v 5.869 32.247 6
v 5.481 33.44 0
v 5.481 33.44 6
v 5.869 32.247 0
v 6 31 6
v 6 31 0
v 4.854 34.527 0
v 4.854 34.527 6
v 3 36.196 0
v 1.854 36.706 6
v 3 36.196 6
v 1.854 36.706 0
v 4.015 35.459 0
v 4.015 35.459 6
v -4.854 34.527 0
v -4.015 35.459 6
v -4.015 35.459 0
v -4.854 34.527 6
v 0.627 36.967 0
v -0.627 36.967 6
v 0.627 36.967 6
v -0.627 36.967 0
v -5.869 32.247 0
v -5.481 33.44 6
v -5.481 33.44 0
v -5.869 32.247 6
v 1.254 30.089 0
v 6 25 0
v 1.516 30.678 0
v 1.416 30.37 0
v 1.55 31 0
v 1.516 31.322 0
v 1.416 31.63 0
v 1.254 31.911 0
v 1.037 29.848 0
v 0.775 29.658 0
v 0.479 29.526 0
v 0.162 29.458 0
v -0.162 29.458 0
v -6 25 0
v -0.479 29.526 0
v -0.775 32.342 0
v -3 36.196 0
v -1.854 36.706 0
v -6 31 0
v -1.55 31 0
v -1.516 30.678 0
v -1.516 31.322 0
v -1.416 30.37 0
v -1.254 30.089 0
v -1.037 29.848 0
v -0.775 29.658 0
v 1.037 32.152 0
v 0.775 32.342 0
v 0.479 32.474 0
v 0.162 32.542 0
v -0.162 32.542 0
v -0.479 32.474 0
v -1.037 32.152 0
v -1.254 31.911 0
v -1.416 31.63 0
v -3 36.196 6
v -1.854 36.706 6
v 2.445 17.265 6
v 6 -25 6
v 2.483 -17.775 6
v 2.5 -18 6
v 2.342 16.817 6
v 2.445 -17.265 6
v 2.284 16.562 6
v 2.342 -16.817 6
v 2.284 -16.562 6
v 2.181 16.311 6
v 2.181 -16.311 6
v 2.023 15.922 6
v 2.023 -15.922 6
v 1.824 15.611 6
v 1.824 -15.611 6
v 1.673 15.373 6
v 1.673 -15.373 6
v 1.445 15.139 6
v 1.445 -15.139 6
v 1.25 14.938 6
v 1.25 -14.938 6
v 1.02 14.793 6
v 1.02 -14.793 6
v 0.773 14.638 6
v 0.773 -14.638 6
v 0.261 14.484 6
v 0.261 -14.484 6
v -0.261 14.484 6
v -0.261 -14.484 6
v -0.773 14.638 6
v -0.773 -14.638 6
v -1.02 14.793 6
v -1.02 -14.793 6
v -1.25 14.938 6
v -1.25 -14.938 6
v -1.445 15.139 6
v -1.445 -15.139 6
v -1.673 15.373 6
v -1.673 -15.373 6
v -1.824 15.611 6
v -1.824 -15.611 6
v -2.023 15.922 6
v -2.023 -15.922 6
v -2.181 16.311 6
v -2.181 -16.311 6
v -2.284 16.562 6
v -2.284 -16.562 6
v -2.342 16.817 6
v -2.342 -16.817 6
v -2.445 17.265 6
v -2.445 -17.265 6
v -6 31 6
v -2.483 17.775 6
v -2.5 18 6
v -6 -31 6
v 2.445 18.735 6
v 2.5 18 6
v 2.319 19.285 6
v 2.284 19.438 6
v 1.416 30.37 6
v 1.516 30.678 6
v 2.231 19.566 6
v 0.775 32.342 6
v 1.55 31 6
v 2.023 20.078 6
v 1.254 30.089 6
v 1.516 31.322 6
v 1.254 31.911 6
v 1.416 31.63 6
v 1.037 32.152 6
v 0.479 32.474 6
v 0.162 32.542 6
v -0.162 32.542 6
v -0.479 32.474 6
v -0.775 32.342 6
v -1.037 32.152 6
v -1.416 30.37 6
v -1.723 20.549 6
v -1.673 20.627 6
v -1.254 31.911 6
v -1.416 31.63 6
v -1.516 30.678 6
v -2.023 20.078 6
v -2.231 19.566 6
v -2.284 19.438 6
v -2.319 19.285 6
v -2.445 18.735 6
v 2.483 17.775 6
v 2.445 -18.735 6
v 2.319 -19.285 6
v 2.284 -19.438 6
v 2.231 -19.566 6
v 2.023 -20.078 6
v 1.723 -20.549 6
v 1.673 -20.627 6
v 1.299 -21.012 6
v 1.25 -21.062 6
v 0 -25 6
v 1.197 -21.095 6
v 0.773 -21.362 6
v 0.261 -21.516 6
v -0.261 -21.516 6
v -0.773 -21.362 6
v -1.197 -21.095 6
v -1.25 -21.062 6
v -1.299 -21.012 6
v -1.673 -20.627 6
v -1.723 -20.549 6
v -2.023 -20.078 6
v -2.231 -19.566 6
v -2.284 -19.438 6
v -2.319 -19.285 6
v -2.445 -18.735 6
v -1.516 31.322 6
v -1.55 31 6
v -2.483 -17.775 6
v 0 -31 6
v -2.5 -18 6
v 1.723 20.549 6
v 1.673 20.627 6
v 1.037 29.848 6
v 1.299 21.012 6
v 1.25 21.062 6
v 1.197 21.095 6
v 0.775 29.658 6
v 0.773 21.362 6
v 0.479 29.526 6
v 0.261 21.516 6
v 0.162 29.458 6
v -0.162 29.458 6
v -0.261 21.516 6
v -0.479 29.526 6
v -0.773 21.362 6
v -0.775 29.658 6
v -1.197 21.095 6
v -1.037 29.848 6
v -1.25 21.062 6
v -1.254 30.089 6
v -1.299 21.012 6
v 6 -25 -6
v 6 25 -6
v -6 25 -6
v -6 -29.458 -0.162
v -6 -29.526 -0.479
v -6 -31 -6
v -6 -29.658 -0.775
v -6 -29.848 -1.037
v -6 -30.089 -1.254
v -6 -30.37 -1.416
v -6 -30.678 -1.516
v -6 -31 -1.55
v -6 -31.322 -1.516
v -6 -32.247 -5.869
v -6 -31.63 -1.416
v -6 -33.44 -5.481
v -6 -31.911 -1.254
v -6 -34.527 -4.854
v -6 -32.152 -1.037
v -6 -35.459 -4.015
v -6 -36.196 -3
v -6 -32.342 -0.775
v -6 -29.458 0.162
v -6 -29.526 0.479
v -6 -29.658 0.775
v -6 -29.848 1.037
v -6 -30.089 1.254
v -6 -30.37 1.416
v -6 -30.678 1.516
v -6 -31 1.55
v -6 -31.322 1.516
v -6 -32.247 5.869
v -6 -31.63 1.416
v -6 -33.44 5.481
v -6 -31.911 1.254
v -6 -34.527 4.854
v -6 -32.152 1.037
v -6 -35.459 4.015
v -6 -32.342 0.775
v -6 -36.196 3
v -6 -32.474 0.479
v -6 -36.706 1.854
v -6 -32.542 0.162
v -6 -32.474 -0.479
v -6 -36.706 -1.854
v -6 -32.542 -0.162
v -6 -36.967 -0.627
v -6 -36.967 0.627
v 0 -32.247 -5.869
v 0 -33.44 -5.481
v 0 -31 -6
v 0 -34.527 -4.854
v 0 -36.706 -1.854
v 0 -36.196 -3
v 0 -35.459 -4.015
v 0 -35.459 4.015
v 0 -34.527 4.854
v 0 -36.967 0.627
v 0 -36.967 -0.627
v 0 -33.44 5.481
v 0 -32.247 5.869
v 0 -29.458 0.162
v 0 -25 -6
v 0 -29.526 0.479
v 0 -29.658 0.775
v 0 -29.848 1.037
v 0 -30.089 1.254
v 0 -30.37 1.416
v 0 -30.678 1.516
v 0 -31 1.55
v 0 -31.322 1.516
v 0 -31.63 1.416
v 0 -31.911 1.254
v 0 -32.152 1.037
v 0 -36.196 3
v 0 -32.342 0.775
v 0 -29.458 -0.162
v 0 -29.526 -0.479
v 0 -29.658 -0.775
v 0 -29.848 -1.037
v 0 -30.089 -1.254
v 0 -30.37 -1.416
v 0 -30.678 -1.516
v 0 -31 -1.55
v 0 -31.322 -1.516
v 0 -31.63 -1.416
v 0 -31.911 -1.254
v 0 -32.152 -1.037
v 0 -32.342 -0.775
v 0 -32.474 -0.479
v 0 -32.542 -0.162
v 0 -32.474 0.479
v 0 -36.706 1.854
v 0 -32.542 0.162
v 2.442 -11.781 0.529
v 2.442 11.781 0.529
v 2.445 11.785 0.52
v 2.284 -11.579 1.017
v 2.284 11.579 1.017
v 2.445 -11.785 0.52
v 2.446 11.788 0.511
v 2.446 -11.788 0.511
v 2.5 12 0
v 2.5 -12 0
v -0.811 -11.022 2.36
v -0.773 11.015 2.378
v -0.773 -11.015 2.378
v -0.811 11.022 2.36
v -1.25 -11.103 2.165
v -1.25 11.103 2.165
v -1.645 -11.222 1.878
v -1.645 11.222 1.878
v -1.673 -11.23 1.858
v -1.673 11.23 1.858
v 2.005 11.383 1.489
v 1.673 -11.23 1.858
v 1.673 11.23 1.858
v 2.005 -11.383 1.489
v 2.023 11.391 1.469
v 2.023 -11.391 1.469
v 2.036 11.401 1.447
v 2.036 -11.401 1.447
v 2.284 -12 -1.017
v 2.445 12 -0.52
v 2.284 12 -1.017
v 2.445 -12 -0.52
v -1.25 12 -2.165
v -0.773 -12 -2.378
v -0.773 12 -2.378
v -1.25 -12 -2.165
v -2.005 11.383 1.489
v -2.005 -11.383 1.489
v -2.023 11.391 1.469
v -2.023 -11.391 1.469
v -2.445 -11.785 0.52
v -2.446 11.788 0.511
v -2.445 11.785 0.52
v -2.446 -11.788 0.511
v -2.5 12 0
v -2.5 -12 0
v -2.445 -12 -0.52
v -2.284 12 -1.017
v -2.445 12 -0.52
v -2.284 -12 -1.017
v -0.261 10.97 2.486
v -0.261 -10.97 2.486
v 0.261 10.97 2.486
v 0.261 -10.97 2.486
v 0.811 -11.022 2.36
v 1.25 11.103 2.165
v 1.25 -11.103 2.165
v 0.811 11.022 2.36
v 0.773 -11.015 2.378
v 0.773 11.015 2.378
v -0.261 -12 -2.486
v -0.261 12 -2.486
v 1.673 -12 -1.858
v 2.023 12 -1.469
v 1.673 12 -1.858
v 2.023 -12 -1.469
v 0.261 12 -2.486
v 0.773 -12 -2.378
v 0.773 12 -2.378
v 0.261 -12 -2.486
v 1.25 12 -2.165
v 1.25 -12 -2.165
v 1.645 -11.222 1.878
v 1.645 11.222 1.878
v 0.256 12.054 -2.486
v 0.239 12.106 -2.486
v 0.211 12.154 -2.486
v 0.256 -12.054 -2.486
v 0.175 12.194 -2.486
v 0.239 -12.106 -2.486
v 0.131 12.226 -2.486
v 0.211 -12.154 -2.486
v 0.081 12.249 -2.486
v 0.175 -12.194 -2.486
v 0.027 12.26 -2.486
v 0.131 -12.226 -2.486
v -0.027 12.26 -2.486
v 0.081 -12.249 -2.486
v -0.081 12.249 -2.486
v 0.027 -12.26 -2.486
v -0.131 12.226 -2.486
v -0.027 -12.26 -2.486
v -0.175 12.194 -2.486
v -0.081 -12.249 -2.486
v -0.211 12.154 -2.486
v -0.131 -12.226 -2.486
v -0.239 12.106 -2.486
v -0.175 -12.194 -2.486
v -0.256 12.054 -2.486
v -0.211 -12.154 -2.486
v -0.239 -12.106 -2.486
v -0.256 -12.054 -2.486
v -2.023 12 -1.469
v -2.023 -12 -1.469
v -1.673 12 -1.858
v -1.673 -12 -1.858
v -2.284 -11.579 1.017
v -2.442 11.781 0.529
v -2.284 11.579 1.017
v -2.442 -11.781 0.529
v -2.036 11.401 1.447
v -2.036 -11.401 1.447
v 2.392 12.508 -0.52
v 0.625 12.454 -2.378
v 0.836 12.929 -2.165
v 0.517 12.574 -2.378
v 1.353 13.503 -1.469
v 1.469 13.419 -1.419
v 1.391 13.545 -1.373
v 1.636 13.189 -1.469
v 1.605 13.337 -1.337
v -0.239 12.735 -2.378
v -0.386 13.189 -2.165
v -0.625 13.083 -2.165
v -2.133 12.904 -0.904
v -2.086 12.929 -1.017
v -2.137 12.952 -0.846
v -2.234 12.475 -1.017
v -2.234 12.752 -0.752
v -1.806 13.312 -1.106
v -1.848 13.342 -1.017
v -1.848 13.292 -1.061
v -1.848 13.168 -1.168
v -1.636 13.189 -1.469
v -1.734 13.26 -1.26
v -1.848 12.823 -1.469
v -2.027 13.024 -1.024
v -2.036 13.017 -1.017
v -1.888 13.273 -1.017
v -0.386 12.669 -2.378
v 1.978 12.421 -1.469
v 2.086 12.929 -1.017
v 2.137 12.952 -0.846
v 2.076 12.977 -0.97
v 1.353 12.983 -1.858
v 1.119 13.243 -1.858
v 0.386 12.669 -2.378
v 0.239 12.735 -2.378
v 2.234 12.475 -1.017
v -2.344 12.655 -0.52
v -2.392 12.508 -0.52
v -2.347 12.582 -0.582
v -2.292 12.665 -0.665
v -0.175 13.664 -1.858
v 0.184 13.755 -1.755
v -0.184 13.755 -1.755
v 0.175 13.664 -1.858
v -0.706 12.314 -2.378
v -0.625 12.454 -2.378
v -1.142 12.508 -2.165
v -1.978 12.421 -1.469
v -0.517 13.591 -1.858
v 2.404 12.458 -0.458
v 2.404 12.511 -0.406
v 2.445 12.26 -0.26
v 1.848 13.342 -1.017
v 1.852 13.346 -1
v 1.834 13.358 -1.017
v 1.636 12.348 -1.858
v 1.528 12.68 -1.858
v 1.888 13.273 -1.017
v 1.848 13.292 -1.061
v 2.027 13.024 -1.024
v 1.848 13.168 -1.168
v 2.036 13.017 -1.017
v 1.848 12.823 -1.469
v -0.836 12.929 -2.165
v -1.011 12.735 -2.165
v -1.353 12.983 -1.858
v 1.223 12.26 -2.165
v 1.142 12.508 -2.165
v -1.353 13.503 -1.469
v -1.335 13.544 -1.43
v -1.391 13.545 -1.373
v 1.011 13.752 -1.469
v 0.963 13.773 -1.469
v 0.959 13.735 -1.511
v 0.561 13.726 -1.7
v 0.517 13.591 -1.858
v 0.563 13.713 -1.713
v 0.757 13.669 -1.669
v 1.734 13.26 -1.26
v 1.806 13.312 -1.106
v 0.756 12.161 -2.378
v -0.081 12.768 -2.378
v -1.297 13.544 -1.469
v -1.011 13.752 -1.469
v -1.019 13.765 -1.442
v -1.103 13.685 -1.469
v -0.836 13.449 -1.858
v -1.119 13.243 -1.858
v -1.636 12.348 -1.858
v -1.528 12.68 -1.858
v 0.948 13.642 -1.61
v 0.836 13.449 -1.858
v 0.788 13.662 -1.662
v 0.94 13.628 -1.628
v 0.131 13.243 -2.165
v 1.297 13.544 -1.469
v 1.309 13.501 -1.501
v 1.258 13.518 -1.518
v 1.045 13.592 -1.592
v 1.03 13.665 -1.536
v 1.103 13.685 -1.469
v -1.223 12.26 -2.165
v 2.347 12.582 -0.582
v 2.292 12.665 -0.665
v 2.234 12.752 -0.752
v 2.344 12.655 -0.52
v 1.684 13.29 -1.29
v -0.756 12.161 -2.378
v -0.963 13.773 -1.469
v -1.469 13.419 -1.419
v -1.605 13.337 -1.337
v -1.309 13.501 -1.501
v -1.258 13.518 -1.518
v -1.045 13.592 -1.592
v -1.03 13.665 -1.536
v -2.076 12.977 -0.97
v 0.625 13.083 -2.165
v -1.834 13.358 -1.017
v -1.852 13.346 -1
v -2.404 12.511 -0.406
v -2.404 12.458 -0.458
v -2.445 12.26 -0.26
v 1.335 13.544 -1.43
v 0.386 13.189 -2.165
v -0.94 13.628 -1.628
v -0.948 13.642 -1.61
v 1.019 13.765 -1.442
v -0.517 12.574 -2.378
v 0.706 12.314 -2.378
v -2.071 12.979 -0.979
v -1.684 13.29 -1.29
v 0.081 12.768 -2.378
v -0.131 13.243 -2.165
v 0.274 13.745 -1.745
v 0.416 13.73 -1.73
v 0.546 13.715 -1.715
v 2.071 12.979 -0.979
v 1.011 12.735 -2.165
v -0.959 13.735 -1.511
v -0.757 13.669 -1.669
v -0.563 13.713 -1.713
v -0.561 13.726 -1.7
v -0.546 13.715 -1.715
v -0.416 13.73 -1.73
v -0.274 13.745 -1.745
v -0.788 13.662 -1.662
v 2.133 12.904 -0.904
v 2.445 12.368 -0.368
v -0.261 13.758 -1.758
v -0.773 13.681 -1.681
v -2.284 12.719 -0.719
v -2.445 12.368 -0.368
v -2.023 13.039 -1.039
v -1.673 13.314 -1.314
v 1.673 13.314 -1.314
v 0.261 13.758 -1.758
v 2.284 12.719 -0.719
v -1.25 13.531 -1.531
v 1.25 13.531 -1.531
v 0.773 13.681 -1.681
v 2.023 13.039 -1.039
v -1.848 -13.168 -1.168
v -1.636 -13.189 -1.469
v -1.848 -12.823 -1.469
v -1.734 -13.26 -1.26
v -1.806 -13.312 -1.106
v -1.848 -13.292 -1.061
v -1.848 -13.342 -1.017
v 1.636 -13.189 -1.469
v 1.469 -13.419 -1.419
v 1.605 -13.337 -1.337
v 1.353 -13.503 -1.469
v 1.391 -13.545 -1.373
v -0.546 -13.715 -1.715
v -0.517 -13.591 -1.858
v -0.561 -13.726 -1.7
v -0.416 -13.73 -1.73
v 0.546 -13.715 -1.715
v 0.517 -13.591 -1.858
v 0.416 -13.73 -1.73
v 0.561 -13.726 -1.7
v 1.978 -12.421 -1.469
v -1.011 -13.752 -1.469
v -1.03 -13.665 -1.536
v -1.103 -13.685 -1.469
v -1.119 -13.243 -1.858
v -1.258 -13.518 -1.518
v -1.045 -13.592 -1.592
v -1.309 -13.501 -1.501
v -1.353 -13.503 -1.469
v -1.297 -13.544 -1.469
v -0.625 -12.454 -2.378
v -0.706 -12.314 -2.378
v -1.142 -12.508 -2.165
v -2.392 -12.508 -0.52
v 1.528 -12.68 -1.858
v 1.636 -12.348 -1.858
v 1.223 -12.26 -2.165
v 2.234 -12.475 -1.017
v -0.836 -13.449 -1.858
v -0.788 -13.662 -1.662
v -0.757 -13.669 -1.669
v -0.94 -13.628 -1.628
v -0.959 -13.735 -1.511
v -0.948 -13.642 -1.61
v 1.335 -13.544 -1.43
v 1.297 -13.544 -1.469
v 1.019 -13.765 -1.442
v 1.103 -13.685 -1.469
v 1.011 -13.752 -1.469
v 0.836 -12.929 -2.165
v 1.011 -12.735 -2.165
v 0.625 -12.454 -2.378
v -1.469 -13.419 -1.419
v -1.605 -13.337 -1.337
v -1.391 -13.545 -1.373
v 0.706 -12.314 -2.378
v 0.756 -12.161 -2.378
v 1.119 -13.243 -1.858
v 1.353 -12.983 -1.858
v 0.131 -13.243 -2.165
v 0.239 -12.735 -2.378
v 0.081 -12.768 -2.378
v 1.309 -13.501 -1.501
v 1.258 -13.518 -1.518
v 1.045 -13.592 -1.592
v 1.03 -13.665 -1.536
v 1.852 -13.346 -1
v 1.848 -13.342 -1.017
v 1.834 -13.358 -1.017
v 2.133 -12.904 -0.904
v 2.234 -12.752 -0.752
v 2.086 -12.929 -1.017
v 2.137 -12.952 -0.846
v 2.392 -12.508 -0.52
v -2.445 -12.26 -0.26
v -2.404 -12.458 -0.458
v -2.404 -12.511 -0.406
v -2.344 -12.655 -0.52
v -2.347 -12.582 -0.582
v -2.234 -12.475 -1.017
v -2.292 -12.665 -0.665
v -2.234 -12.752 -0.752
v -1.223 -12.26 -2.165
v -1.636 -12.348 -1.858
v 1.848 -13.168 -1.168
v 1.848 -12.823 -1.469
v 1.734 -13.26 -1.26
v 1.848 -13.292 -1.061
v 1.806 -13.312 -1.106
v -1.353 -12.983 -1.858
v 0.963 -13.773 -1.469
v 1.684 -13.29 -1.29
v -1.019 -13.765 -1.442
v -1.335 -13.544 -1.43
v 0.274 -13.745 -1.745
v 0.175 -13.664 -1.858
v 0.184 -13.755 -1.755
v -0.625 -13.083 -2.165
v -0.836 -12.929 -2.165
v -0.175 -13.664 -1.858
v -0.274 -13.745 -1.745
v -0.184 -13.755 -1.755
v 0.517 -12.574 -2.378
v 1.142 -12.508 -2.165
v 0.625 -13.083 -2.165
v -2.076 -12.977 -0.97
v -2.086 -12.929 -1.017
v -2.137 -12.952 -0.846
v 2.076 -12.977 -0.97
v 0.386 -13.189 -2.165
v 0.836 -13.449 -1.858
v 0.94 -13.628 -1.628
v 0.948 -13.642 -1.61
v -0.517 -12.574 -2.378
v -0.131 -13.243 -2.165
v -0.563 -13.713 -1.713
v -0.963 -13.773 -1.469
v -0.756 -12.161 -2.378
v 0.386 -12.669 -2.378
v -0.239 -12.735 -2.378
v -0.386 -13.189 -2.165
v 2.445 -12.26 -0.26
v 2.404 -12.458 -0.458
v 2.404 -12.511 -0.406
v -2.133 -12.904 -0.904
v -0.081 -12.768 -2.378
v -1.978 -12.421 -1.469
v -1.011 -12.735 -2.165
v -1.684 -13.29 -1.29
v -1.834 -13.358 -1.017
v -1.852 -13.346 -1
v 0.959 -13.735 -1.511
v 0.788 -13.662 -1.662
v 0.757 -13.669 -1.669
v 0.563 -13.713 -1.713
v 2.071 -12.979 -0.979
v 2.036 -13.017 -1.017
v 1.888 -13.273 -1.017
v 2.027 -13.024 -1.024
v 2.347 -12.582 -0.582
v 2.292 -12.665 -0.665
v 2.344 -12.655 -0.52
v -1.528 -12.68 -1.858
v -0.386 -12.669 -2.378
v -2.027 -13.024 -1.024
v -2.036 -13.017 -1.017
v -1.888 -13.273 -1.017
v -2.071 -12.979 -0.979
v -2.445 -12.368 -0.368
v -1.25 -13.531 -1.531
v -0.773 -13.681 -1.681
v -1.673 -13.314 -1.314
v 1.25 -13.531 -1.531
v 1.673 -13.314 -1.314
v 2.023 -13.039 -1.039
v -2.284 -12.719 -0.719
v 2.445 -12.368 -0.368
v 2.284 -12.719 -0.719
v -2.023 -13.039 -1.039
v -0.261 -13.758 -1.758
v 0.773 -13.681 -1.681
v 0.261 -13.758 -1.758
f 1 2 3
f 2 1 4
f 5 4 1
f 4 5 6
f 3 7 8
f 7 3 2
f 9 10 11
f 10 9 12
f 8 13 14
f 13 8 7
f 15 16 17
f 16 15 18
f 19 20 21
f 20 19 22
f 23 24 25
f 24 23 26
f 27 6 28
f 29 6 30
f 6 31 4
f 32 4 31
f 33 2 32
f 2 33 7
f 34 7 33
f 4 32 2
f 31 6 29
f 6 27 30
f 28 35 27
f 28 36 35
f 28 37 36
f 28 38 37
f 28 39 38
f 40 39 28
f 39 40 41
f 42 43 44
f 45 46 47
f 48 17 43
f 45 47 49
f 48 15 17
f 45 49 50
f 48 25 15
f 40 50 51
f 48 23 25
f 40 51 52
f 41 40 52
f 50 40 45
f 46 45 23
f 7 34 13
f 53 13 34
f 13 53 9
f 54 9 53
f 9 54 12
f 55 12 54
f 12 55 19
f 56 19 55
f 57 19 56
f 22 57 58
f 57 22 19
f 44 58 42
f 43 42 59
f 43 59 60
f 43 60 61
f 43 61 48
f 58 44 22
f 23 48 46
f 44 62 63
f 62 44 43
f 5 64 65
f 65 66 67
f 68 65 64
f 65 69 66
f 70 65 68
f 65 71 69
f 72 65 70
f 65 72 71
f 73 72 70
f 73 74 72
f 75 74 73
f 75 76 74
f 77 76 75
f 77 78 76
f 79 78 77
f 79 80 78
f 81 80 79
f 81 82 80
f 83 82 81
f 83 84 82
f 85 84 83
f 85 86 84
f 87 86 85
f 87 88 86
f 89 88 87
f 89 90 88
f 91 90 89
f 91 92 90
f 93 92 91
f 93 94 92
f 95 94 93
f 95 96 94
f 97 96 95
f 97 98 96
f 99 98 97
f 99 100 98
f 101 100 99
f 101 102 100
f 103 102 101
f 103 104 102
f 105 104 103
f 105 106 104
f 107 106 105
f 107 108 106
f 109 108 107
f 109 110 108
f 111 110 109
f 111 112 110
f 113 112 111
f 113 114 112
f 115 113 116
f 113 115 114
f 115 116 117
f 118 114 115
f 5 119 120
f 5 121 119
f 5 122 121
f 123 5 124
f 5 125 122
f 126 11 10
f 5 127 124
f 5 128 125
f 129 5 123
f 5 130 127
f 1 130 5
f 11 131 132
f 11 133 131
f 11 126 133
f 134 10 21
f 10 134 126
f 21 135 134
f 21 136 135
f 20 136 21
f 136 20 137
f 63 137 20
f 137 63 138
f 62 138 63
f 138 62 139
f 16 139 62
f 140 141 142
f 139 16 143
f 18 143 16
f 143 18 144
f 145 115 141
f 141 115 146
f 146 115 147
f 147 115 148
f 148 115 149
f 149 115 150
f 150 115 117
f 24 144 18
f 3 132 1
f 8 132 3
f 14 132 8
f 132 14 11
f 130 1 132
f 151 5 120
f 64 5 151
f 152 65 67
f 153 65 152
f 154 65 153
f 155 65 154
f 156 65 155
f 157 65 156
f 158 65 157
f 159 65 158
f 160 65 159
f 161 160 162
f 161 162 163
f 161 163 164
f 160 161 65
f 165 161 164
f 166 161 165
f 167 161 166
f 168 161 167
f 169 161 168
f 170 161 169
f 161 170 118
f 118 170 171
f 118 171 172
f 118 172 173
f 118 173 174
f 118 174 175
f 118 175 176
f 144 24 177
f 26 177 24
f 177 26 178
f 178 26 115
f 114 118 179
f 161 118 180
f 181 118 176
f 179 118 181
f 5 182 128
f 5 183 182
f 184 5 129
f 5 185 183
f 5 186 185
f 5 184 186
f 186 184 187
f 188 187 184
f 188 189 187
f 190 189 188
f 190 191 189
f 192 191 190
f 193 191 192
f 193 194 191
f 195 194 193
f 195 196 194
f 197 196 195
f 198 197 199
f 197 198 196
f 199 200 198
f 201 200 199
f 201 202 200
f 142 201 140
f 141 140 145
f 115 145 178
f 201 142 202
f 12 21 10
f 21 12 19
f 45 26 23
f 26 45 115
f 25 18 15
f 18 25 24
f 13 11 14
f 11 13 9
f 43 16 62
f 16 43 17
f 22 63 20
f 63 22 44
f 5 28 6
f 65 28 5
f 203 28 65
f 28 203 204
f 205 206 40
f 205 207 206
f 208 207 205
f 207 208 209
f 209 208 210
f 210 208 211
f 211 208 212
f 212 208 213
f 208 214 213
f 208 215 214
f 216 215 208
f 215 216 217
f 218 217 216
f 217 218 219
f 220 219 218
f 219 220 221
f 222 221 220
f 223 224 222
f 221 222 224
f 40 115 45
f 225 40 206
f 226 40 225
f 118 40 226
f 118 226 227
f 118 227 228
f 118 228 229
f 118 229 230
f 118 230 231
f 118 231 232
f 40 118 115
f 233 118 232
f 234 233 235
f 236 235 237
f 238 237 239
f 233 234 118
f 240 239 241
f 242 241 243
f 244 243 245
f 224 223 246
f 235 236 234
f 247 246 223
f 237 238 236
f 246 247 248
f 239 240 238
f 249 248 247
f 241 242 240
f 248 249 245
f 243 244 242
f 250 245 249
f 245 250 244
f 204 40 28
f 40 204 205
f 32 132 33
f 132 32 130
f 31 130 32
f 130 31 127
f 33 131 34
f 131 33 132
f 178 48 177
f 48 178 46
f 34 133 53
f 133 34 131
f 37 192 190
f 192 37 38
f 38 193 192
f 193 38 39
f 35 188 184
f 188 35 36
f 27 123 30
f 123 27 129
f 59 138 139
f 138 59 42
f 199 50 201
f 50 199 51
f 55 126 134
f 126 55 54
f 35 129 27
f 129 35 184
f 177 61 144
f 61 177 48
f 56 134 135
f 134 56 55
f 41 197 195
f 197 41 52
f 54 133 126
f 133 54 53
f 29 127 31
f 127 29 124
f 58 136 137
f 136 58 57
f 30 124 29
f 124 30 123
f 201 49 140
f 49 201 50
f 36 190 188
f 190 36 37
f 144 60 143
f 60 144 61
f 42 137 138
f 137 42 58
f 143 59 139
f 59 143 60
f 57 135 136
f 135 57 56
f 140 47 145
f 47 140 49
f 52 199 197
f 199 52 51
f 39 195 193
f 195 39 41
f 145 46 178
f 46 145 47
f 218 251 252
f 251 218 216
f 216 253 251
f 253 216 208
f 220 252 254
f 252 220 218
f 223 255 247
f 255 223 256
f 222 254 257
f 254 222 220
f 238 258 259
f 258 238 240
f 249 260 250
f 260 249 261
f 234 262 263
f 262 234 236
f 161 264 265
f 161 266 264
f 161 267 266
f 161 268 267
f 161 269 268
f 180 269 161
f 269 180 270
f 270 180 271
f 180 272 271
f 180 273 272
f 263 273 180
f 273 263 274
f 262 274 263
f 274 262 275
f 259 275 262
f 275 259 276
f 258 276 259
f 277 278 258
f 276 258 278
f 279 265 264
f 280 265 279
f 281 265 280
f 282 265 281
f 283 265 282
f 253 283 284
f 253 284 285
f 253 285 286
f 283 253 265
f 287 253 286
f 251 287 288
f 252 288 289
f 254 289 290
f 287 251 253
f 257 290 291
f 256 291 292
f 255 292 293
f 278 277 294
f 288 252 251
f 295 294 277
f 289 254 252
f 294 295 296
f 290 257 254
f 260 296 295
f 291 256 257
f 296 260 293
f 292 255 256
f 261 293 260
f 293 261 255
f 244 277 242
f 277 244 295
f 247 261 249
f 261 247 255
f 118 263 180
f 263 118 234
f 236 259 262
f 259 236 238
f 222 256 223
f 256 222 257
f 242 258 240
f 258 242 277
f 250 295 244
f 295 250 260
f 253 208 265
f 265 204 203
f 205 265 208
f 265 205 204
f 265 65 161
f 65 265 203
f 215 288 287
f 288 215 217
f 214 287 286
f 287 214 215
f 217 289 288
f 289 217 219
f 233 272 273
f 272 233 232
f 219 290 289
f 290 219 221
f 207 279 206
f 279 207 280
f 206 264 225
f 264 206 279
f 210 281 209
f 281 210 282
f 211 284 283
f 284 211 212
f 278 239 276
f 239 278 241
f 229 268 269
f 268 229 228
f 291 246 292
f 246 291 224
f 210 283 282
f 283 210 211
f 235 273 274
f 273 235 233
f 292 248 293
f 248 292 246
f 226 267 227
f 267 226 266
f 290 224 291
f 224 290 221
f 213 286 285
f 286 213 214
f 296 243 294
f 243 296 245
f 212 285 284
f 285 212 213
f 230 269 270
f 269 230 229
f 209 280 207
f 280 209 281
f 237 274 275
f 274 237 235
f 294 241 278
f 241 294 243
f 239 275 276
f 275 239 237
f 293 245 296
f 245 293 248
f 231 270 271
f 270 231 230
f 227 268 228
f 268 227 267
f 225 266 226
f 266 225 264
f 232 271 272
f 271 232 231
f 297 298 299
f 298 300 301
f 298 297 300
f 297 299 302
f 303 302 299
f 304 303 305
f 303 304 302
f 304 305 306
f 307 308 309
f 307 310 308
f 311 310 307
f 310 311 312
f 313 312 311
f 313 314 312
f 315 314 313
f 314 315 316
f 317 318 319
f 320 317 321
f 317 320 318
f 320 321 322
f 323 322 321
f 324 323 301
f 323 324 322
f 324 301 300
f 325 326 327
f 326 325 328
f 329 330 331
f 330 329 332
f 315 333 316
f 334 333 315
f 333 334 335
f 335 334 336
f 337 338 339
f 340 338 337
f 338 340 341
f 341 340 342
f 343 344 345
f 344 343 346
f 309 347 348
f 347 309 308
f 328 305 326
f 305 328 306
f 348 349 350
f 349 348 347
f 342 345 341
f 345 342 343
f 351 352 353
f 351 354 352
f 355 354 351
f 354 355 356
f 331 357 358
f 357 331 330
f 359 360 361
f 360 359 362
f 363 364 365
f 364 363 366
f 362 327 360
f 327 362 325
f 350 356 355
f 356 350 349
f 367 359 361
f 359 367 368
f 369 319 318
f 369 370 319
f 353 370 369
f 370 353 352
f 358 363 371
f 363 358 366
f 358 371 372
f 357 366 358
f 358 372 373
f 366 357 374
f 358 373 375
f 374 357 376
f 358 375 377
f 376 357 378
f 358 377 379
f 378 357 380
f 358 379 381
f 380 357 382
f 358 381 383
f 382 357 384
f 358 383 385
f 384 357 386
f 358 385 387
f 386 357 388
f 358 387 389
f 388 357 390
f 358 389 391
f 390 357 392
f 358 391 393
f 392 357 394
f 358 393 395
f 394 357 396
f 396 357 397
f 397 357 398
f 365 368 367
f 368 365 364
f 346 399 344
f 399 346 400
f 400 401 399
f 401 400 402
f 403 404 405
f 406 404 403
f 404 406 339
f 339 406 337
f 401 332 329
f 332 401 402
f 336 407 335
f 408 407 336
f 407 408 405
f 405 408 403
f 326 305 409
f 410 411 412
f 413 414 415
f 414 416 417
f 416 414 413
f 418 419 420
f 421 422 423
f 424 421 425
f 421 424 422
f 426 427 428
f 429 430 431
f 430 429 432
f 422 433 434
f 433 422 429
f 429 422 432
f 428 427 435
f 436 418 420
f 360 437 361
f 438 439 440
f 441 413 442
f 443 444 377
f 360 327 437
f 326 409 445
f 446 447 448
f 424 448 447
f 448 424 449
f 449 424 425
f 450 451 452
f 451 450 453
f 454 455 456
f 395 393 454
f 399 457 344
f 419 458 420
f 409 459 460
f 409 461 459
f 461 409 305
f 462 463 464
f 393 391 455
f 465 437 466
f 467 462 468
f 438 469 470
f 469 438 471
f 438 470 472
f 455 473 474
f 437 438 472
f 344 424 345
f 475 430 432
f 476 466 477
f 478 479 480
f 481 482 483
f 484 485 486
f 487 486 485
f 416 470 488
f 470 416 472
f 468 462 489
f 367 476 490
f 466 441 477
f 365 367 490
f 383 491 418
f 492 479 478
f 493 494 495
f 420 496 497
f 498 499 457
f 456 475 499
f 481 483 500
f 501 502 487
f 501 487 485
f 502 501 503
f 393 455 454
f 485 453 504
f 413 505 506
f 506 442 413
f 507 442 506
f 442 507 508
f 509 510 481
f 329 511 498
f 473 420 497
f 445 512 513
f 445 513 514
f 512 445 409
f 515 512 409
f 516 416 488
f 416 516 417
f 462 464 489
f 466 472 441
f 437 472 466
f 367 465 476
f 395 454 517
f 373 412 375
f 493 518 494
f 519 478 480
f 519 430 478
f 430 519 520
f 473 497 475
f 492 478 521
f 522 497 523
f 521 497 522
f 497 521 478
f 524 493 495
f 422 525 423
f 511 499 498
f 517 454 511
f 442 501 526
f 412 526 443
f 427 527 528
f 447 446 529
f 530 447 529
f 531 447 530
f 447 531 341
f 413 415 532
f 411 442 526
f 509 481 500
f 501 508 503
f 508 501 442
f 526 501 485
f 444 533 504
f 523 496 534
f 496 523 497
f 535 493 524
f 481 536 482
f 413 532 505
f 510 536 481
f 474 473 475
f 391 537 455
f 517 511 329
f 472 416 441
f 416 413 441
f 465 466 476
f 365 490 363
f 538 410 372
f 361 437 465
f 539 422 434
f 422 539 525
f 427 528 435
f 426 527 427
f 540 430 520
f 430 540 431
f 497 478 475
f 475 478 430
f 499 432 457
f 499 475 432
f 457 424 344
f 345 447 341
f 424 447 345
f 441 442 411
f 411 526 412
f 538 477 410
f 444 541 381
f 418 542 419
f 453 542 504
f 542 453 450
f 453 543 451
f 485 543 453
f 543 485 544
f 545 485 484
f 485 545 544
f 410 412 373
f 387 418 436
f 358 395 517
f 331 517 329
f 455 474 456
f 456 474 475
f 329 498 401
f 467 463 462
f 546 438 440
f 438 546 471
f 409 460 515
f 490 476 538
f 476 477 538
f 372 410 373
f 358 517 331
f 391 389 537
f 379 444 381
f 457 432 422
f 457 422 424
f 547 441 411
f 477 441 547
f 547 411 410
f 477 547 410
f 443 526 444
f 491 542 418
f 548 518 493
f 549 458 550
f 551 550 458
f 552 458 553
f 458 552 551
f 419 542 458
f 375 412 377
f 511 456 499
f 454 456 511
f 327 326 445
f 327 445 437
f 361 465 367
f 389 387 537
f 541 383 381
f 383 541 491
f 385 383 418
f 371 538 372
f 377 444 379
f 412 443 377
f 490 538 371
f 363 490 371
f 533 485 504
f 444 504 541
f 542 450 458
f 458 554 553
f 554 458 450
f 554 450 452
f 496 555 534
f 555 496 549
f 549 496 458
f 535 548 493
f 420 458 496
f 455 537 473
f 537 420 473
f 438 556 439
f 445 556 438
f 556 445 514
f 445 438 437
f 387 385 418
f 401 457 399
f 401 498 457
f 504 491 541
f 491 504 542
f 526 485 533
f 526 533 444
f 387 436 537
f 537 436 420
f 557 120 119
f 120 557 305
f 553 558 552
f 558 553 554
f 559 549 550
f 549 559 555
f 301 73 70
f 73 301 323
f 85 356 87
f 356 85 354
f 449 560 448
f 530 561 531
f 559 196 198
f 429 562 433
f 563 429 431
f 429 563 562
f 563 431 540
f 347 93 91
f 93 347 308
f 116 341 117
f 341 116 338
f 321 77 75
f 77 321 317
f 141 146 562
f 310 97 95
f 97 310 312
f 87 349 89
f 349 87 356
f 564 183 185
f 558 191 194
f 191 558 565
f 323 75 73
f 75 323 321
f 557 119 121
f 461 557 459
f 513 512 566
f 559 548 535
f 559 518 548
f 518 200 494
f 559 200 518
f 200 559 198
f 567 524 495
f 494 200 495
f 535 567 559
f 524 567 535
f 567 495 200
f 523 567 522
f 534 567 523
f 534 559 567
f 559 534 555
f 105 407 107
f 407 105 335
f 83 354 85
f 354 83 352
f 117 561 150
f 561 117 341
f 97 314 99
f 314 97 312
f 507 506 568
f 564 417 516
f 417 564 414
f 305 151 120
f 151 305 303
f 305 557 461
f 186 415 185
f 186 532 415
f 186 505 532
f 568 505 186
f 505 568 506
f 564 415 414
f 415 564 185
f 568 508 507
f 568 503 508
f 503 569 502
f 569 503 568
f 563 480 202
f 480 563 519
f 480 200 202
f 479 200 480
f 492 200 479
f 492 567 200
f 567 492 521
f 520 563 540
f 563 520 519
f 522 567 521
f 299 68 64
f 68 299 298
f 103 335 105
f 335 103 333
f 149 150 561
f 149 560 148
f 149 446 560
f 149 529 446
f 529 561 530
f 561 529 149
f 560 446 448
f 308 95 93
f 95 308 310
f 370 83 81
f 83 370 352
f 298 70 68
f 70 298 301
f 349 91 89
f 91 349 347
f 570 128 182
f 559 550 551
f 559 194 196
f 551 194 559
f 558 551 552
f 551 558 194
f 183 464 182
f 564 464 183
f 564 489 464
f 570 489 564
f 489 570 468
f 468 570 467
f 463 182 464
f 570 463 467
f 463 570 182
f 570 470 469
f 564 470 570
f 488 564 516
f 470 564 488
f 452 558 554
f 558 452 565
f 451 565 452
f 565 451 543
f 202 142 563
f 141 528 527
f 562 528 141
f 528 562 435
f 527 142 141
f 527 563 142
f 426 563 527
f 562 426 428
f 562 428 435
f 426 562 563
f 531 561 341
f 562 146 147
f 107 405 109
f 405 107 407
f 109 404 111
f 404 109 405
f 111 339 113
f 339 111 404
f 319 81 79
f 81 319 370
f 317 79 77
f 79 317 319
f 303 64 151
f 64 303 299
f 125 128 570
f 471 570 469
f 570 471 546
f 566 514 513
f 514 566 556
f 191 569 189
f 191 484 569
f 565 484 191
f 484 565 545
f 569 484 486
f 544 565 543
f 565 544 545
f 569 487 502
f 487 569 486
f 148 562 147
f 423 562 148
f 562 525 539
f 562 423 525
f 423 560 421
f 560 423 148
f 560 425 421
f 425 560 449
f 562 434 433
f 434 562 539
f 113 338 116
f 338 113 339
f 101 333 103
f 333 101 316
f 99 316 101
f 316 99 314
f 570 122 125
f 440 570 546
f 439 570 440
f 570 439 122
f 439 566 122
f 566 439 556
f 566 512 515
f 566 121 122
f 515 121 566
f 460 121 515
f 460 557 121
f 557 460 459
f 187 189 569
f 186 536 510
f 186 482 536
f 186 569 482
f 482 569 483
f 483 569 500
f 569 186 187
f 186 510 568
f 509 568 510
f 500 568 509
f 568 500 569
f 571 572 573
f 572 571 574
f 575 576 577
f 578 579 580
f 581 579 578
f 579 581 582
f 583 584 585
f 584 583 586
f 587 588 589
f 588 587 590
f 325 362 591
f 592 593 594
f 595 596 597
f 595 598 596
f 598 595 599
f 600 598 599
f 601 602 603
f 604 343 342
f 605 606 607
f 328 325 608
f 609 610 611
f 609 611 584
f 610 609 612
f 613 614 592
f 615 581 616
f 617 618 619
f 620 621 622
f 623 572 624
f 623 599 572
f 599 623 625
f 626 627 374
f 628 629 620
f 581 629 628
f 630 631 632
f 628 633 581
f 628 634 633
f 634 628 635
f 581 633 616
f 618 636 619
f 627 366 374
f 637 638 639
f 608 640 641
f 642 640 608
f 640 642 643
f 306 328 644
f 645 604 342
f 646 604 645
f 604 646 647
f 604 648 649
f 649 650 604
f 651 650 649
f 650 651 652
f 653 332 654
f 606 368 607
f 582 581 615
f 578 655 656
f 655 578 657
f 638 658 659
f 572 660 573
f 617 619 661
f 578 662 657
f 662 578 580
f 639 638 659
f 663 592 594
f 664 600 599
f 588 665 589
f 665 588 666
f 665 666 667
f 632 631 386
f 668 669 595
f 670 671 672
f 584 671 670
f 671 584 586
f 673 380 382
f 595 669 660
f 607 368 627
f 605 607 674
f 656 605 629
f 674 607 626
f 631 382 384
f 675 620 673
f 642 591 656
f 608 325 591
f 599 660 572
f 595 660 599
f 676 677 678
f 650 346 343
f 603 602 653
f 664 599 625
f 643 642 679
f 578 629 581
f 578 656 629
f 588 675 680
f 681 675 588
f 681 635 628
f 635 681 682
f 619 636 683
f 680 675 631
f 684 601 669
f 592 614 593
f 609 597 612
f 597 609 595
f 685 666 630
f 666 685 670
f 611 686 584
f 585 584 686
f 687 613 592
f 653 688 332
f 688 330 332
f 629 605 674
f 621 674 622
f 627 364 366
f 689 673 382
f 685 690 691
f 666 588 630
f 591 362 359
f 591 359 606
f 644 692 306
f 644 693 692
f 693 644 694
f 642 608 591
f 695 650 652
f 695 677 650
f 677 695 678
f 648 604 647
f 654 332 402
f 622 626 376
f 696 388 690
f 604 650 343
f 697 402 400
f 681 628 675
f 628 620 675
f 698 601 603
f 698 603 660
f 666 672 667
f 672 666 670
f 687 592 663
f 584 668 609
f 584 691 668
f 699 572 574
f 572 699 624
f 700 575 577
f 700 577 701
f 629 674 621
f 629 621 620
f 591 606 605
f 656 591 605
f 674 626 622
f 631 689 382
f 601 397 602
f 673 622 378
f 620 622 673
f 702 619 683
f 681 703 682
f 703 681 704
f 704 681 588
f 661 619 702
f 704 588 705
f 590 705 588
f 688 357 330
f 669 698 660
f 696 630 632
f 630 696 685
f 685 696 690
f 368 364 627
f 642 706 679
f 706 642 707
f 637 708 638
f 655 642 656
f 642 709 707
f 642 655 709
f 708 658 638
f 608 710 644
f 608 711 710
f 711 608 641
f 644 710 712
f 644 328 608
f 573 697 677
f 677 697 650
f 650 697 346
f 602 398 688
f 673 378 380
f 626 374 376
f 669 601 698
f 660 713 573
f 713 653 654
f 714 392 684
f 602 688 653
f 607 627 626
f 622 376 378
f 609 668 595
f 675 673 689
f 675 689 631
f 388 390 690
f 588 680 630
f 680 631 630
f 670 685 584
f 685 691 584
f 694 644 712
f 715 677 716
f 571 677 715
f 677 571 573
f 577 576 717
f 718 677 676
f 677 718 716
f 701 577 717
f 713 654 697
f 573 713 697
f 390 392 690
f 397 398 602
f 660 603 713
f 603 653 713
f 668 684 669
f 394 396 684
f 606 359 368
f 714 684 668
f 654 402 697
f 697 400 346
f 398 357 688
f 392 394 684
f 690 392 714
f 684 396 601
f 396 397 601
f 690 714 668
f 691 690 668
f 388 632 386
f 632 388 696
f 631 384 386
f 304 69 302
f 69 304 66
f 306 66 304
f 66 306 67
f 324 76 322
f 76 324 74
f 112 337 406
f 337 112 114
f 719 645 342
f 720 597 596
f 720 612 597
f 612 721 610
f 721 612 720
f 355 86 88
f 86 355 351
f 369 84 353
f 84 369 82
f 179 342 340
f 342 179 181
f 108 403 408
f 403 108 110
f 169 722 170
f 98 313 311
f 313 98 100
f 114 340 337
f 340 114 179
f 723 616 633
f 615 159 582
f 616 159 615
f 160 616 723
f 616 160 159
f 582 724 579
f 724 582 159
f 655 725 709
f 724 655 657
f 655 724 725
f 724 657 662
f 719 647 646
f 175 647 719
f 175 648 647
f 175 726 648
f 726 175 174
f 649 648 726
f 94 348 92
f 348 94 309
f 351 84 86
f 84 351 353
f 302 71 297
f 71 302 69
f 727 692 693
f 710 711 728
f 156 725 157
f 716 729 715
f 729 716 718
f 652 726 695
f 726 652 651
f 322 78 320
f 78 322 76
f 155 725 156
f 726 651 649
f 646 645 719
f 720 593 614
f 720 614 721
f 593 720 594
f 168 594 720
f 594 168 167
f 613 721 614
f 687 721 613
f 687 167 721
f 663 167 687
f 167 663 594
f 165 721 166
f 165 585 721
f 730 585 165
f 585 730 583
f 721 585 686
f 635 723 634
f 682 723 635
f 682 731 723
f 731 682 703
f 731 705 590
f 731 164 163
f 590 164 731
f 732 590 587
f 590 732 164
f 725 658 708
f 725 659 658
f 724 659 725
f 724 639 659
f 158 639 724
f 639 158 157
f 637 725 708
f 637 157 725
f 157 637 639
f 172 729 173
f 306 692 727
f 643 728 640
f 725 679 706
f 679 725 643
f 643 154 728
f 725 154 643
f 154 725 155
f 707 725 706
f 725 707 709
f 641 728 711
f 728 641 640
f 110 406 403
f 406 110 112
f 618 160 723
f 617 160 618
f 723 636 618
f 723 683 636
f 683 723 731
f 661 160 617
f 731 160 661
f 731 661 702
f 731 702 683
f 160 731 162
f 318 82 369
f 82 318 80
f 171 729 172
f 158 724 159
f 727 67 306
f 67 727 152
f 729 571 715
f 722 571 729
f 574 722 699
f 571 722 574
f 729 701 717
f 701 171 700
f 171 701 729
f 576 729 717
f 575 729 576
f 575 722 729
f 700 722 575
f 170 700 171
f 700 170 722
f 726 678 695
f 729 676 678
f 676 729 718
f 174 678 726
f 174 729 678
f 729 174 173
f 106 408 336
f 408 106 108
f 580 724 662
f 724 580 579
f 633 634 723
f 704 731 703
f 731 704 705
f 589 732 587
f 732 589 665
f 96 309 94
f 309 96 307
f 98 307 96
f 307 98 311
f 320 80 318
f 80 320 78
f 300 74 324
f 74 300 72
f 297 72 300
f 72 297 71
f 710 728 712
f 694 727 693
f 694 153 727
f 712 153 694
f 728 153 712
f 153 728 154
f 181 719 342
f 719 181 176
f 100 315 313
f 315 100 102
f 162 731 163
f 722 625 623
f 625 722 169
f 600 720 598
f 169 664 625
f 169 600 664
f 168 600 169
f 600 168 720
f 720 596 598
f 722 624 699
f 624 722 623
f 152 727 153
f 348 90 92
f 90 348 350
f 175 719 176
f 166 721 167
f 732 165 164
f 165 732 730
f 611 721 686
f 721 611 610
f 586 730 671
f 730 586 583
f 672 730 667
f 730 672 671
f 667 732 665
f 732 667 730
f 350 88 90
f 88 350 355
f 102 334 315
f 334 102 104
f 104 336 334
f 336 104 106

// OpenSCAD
////----FoldingRod2.scad----
////----OpenSCAD Version 2015.03-2----
////----2018.6.23
////----By Kijja Chaovanakij----
////
////----2018.7.6----
////----rename variable and add comment for easy understand
////
////----2018.7.8----
////----joint can rotate 4 directions

/* [var] */
//number of fragments[30=low:60=medium:90=high]
$fn=30;
//reduce garbage in preview[0.01]
garbage=0.01;

/* [rod var] */
//rod size[12]
rod_size=12;
//rod length[50]
rod_length=50;

/* [pipe var] */
//pipe radius[2.5]
pipe_radius=2.5;
//[1=insert pipe:other=no pipe:]
pipe_insert=1;

/* [joint var] */
//bolt M3[1.35] M4[1.9]
bolt_radius=1.35;
//bolt hole tolerence[0.2]
hole_tolerence=0.2;
//1=top:2=bottom:3=left:4=right:other=no joint:
joint_a=1;
//1=top:2=bottom:3=left:4=right:other=no joint:
joint_b=3;

////----main----
//horizontal pipe length
pipe_length=rod_length-rod_size*1.75-pipe_radius*2;
difference(){
  rod();
  if (pipe_insert==1)
    pipe();
}
//

module rod()
union(){
  cube([rod_size,rod_length,rod_size],true);
  
  if (joint_a==1)
    translate([0,(rod_length+rod_size)/2,rod_size/4])
    rodjoint();
  
  if (joint_a==2)
    translate([0,(rod_length+rod_size)/2,-rod_size/4])
    rodjoint();
  
  if (joint_a==3)
    translate([-rod_size/4,(rod_length+rod_size)/2,0])
    rotate([0,90,0])
    rodjoint();
  
  if (joint_a==4)
    translate([rod_size/4,(rod_length+rod_size)/2,0])
    rotate([0,90,0])
    rodjoint();
  
  if (joint_b==1)
    translate([0,-(rod_length+rod_size)/2,rod_size/4])
    rotate([0,0,180])
    rodjoint();
  
  if (joint_b==2)
    translate([0,-(rod_length+rod_size)/2,-rod_size/4])
    rotate([0,0,180])
    rodjoint();
  
  if (joint_b==3)
    translate([-rod_size/4,-(rod_length+rod_size)/2,0])
    rotate([0,90,180])
    rodjoint();
  
  if (joint_b==4)
    translate([rod_size/4,-(rod_length+rod_size)/2,0])
    rotate([0,90,180])
    rodjoint();
}
//

module rodjoint()
color("Tan")
difference(){
  union(){
    cylinder(rod_size/2,rod_size/2,rod_size/2,true);
    translate([0,-rod_size/4,0])
    cube([rod_size,rod_size/2,rod_size/2],true);
  }
  
  cylinder(rod_size/2+garbage,bolt_radius+hole_tolerence,bolt_radius+hole_tolerence,true);
}
//

module pipe()
union(){
  rotate([90,0,0])
  cylinder(pipe_length,pipe_radius,pipe_radius,true);
  
  translate([0,pipe_length/2,0])
  sphere(pipe_radius);
  
  translate([0,pipe_length/2,0])
  rotate([-45,0,0])
  cylinder(rod_size,pipe_radius,pipe_radius);
  
  translate([0,-pipe_length/2,0])
  sphere(pipe_radius);
  
  translate([0,-pipe_length/2,0])
  rotate([45,0,0])
  cylinder(rod_size,pipe_radius,pipe_radius);
}
//
